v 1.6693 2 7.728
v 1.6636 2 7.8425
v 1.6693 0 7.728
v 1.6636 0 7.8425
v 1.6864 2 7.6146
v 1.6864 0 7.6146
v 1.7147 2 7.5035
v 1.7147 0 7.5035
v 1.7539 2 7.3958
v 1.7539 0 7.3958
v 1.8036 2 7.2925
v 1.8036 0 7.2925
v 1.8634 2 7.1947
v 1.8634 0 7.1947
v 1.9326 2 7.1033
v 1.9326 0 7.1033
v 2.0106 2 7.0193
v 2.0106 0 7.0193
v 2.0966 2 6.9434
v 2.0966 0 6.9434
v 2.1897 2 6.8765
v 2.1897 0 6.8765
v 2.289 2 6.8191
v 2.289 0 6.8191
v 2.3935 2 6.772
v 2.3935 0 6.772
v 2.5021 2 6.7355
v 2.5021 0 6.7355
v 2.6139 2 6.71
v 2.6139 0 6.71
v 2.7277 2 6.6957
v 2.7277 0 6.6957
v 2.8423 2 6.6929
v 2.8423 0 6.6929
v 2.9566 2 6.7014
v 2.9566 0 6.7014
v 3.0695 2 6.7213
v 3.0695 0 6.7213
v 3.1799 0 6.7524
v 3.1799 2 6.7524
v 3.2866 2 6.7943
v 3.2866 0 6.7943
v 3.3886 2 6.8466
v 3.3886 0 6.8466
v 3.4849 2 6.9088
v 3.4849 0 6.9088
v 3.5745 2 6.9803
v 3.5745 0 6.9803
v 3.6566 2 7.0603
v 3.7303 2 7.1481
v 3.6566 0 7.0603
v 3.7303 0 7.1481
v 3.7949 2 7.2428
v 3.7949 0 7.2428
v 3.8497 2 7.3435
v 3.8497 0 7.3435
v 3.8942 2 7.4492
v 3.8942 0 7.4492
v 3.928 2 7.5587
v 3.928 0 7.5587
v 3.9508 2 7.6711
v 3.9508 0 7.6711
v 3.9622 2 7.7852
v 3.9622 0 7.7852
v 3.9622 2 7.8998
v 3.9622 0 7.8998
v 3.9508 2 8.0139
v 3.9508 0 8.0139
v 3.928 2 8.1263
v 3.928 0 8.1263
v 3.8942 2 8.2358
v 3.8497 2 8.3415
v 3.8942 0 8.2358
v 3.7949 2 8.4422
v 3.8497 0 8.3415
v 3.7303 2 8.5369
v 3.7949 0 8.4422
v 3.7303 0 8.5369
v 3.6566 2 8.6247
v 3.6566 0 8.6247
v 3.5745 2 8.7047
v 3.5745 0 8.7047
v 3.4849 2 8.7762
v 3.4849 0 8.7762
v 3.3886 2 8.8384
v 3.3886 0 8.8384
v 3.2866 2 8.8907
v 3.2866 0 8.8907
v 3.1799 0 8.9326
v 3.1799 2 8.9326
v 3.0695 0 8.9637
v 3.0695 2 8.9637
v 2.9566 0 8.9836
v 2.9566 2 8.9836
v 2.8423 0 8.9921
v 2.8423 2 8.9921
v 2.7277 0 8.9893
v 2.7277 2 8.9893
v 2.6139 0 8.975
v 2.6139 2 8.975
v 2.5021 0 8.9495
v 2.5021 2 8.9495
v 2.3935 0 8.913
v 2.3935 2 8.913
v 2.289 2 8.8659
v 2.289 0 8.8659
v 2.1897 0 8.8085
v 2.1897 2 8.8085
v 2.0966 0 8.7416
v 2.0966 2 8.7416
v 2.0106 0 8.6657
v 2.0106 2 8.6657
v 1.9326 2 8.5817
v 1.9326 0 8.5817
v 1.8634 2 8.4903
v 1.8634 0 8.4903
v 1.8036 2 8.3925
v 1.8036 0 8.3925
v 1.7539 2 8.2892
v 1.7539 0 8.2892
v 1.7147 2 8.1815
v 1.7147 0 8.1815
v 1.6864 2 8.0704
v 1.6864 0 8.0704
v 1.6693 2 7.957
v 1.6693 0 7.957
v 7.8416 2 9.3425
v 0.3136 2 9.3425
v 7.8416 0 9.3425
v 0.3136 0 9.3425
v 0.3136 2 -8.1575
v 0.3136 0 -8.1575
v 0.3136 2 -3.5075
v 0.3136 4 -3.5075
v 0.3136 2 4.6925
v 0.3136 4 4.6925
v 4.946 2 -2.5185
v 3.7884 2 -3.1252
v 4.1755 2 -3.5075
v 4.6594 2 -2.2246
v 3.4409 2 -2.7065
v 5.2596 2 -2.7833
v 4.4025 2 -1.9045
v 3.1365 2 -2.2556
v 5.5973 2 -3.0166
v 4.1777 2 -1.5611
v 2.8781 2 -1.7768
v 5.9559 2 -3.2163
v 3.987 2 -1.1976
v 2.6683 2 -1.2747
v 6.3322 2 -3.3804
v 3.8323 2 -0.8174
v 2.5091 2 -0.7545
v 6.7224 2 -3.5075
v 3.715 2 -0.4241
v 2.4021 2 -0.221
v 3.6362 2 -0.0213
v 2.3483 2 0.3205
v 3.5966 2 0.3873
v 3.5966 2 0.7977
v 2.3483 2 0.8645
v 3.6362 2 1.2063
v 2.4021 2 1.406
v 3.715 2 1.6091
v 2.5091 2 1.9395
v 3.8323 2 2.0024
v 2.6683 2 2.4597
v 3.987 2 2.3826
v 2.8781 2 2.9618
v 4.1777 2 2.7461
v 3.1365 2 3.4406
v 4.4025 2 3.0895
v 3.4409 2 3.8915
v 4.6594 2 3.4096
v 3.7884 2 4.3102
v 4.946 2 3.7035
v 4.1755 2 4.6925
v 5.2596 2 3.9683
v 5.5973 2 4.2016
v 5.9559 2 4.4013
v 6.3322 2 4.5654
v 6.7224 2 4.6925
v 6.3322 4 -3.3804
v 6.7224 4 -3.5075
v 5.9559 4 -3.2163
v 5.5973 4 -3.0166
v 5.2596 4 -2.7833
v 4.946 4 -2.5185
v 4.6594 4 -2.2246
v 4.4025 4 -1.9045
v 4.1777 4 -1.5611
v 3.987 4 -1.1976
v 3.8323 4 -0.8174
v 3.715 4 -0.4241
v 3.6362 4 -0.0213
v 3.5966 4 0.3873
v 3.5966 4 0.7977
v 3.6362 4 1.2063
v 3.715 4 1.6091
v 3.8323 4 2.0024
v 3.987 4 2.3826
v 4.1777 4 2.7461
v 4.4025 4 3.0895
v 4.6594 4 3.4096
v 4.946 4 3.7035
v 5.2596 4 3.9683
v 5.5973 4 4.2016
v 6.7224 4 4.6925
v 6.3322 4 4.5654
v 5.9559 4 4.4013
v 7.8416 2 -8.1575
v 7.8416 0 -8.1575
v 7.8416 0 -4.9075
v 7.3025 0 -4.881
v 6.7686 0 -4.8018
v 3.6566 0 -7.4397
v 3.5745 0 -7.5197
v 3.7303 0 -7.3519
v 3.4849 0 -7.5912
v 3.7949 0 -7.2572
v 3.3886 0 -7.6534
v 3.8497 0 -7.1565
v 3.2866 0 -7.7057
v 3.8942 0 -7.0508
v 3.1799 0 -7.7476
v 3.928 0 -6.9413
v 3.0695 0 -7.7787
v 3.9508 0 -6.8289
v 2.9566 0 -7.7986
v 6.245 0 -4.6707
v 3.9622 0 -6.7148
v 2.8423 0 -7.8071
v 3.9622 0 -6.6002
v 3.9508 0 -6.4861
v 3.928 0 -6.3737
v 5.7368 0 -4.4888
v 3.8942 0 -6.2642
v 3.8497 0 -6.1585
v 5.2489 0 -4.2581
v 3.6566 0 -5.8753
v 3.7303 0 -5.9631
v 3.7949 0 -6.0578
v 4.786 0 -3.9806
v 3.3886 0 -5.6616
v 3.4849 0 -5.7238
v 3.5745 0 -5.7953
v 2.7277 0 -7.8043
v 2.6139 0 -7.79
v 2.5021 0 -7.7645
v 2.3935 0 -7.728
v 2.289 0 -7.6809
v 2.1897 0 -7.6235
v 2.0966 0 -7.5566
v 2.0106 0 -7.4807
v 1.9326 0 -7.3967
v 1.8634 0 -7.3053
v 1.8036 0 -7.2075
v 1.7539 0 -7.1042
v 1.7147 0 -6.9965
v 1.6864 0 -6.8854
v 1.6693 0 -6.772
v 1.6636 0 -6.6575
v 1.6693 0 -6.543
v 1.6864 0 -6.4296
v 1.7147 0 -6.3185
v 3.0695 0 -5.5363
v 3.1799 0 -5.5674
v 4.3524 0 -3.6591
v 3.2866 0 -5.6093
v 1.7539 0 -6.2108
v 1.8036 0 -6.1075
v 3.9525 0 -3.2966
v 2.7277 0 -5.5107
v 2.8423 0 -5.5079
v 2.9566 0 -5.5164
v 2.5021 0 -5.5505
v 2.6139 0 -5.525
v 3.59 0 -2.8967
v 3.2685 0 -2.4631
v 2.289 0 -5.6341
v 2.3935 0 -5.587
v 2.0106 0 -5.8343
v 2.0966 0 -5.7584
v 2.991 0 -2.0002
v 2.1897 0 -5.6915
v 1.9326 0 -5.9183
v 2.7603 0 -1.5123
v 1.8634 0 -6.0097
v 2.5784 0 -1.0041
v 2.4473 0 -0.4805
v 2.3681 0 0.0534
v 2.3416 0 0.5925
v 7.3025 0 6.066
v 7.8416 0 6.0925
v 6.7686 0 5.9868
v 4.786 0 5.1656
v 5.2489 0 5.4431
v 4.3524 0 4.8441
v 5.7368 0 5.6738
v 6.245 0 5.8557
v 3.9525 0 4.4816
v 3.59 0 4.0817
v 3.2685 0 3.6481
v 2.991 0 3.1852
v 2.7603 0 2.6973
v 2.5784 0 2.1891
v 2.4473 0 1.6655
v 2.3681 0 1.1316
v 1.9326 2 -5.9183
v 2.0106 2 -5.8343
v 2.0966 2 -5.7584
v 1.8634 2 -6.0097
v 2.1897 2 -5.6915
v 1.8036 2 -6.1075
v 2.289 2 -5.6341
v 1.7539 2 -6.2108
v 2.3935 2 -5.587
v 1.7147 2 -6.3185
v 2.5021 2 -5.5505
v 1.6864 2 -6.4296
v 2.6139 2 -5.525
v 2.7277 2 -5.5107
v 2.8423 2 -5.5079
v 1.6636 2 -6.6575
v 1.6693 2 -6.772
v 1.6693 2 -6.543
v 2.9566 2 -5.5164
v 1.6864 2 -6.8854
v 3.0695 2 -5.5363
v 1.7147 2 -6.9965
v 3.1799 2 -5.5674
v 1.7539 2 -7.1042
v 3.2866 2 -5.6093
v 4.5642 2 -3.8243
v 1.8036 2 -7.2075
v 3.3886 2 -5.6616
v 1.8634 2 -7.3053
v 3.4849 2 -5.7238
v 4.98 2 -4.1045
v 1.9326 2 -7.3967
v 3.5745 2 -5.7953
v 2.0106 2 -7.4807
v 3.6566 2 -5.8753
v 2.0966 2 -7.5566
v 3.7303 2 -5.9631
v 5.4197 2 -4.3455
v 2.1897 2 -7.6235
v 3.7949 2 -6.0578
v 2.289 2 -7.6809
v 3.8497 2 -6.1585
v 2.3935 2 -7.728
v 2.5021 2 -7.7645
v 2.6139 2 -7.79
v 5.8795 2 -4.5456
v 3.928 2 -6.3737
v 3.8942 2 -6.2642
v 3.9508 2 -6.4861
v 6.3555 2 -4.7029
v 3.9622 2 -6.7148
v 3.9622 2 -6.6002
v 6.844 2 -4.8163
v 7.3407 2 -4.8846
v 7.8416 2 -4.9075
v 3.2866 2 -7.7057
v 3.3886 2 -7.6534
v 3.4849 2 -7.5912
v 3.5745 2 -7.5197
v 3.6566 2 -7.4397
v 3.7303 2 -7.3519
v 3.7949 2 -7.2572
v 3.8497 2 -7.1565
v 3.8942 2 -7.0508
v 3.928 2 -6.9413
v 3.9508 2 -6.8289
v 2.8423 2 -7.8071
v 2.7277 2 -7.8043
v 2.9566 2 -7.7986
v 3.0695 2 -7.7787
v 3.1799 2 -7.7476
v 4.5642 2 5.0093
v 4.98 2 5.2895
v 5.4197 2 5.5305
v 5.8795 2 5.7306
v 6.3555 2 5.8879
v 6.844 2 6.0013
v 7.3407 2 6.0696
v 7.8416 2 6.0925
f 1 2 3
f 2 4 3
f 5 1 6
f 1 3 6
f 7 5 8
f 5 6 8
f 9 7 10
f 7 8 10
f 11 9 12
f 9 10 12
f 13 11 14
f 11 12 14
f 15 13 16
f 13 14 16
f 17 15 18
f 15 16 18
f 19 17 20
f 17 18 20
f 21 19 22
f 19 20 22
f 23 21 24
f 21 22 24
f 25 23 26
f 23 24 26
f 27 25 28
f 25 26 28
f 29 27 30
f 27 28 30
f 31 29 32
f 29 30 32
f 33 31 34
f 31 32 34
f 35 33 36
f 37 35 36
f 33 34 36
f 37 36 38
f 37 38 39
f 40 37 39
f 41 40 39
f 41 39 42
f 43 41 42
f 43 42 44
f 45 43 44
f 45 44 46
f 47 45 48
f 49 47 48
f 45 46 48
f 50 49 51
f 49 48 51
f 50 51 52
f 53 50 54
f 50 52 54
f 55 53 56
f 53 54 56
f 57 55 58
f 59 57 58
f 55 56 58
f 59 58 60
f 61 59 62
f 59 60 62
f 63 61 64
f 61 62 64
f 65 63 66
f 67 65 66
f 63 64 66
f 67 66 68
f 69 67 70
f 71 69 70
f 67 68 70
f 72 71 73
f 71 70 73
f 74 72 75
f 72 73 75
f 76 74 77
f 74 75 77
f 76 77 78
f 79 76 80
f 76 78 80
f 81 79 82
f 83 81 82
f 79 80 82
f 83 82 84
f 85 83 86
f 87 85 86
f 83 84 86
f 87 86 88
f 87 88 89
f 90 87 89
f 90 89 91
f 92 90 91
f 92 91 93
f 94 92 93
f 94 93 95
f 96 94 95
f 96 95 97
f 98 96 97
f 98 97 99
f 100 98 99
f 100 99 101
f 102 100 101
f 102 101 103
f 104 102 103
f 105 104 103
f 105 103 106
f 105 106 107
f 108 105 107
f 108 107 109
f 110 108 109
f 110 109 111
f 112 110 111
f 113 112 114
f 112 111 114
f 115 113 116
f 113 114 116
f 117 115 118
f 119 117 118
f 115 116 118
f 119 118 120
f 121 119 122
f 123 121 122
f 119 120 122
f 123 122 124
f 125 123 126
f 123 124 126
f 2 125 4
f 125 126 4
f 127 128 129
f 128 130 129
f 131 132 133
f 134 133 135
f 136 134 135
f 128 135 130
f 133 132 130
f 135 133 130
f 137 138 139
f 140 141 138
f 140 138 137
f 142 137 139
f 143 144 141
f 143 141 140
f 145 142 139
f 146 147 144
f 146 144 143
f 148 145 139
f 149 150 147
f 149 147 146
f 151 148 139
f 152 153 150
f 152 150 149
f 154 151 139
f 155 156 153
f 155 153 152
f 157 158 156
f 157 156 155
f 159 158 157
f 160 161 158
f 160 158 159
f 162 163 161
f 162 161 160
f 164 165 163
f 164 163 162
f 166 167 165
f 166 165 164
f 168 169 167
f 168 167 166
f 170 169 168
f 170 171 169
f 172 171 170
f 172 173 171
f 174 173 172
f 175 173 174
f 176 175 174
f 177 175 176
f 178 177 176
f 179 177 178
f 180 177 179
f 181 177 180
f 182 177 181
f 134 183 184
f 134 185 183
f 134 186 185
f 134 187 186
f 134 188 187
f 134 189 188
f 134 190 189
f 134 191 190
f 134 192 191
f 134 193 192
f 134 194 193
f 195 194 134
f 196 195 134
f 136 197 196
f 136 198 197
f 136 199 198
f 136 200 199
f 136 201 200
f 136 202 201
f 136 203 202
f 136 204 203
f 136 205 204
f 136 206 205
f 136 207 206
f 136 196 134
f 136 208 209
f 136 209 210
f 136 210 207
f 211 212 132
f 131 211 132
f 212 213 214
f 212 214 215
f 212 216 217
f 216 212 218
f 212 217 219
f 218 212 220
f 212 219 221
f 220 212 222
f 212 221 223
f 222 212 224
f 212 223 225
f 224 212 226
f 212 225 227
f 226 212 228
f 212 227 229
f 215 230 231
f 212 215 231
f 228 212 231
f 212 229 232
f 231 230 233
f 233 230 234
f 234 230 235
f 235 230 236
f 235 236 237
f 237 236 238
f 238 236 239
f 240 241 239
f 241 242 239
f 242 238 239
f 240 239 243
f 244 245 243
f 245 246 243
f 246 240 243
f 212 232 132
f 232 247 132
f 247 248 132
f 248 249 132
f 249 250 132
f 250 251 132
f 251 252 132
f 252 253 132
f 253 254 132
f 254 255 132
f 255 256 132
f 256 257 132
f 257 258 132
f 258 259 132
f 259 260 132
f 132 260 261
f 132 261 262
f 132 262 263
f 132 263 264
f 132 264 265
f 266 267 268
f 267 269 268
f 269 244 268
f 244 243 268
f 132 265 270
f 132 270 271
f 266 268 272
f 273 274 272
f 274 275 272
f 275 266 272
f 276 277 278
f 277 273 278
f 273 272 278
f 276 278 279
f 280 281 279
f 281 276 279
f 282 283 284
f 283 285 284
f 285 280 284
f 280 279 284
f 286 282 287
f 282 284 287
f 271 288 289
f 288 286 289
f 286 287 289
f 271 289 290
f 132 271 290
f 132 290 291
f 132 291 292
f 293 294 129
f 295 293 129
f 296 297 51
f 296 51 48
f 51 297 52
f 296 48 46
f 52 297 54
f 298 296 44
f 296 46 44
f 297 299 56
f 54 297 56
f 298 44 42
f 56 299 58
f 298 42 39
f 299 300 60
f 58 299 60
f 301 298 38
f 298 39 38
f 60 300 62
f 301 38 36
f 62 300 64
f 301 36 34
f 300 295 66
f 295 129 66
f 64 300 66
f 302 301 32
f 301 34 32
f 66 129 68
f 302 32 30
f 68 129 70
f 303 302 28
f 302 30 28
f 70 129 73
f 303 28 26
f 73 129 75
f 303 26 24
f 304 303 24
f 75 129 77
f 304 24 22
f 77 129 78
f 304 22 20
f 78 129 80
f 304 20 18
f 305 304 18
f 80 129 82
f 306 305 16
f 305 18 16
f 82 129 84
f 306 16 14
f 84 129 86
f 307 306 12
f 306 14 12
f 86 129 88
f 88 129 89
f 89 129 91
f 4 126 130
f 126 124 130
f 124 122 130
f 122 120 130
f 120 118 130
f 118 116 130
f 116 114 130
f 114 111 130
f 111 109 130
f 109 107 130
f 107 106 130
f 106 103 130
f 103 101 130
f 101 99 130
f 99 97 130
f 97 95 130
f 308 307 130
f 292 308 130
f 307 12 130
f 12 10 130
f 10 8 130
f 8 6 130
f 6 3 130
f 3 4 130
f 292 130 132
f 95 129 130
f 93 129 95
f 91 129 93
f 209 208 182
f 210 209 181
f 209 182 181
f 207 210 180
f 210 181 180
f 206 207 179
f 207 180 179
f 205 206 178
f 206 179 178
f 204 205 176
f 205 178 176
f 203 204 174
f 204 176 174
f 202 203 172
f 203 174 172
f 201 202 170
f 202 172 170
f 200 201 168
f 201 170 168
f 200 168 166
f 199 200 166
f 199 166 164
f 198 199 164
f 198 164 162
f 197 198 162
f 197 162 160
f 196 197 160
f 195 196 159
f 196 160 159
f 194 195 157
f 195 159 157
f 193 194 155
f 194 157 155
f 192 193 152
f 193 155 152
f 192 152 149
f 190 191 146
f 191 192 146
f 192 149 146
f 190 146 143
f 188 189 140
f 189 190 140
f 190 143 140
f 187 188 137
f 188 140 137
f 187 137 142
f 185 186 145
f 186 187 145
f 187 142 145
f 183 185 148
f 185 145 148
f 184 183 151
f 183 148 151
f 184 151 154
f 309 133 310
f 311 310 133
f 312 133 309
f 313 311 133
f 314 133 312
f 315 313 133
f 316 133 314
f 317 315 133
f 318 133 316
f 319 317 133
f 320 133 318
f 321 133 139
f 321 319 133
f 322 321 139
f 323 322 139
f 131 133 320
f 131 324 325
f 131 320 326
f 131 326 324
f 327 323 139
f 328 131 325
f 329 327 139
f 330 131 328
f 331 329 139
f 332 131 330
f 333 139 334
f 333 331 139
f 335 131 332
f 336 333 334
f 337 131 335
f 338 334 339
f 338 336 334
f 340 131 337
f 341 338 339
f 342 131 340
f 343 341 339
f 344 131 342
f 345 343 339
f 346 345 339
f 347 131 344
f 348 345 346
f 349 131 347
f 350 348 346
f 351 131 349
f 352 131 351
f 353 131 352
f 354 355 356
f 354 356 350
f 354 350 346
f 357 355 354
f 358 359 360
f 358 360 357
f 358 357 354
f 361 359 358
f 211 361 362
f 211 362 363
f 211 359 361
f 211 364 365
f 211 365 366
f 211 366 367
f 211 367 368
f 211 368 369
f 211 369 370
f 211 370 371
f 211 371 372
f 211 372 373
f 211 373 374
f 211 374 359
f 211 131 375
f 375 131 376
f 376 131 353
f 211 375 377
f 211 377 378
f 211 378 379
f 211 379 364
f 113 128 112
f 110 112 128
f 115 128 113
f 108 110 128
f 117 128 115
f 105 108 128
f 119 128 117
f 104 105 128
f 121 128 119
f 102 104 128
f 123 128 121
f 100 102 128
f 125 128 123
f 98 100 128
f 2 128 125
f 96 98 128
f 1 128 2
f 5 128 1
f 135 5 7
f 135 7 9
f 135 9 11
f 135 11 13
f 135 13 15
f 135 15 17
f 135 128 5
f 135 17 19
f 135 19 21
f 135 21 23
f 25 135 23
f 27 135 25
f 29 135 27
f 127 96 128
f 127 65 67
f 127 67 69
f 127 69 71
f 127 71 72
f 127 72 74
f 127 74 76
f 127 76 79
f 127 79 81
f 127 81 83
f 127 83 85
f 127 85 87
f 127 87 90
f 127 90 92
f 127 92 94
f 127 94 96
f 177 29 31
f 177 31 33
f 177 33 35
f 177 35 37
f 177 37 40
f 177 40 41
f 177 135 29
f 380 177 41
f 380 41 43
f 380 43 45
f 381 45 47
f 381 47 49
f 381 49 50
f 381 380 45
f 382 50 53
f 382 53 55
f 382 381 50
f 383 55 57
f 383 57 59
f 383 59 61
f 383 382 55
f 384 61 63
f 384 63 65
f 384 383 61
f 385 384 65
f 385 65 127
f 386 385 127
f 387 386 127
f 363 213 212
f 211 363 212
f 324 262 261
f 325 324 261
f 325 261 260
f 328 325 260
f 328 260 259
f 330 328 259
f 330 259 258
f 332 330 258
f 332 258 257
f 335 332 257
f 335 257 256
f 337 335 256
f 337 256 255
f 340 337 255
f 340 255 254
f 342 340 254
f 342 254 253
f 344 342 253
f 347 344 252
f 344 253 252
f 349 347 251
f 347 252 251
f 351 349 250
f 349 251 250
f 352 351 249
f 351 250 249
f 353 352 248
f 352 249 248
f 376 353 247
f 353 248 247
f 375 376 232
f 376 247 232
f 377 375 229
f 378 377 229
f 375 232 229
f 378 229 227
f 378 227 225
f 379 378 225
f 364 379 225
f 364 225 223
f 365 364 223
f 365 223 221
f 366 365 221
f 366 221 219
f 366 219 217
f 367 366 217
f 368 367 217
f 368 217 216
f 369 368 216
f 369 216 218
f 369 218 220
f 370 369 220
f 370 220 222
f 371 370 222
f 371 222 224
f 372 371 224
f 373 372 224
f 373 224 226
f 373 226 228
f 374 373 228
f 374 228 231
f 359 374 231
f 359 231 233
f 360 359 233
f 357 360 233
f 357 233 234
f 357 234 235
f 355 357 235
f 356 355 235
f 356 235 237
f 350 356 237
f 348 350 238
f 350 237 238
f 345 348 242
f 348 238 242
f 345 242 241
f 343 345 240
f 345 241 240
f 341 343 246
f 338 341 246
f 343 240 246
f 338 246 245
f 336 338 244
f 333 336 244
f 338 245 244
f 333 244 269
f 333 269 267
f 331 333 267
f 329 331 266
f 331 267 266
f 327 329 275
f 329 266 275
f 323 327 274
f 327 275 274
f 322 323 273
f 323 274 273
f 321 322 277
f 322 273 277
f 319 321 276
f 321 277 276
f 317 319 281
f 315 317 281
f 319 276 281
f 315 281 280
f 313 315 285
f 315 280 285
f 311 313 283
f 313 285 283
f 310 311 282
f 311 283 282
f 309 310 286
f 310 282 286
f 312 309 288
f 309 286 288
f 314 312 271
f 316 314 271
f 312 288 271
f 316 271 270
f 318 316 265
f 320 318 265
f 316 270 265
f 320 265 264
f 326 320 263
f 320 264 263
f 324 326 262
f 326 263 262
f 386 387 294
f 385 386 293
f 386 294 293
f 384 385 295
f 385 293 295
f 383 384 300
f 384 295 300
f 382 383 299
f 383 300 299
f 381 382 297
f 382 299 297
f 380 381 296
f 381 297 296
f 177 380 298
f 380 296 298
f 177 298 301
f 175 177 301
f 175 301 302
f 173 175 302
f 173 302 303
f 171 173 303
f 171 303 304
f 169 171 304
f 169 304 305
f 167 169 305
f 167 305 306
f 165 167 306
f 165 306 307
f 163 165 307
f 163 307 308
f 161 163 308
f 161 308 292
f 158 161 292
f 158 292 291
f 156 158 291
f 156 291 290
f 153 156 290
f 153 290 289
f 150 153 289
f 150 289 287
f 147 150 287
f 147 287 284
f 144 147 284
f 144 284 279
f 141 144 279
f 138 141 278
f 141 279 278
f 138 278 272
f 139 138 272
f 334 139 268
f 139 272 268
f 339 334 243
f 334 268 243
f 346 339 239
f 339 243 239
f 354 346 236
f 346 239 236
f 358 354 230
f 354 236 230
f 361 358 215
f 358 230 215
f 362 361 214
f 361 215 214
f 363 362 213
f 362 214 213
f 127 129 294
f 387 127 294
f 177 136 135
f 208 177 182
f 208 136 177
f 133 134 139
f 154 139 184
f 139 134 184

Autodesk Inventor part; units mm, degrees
ref_plane "YZ Plane" through (0, 0, 0) normal (1, 0, 0) x (0, 1, 0)
ref_plane "XZ Plane" through (0, 0, 0) normal (0, 1, 0) x (-1, 0, 0)
ref_plane "XY Plane" through (0, 0, 0) normal (0, 0, 1) x (1, 0, 0)
sketch "Sketch1" plane through (0, 0, 0) normal (0, 1, 0) x (-1, 0, 0)
  line L0 (-0.3136, 9.3425) -> (-7.8416, 9.3425)
  line L1 (-7.8416, -8.1575) -> (-0.3136, -8.1575)
  line L2 (-0.3136, -8.1575) -> (-0.3136, 9.3425)
  circle A0 centre (-2.8136, 7.8425) radius 1.15
  circle A1 centre (-2.8136, -6.6575) radius 1.15
  arc A2 (-7.8416, -3.6575) -> (-7.8416, 4.8425) centre (-7.8416, 0.5925) ccw
  line L3 (-7.8416, 9.3425) -> (-7.8416, 4.8425)
  line L4 (-7.8416, -3.6575) -> (-7.8416, -8.1575)
  point P0 (0, 0)
  point P1 (0, 0)
  dimension "d0" = 17.5
  dimension "d1" = 2.5
  dimension "d2" = 2.5
  dimension "d3" = 1.5
  dimension "d4" = 1.5
  dimension "d5" = 2.3
  dimension "d6" = 2.3
  dimension "d7" = 8.5
  dimension "d8" = 7.528
  dimension "d9" = 8.75
extrude "Extrusion1" add sketch "Sketch1" along normal blind 4
sketch "Sketch3" plane through (0, 0, 0) normal (0, -1, 0) x (1, 0, 0)
  circle A0 centre (7.8416, 0.5925) radius 5.5
  line L0 (7.8416, 9.3425) -> (7.8416, 4.8425) projected
  line L1 (7.8416, -8.1575) -> (0.3136, -8.1575) projected
  point P0 (0, 0)
  dimension "d12" = 11
  dimension "d13" = 0
  dimension "d14" = 8.75
extrude "Extrusion2" cut sketch "Sketch3" against normal blind 2
sketch "Sketch4" plane through (0, 4, 0) normal (0, 1, 0) x (1, 0, 0)
  line L0 (7.8416, -9.3425) -> (0.3136, -9.3425)
  line L1 (0.3136, -9.3425) -> (0.3136, -4.6925)
  line L2 (0.3136, -4.6925) -> (7.8416, -4.6925)
  line L3 (7.8416, -4.6925) -> (7.8416, -9.3425)
  line L4 (7.8416, 3.6575) -> (7.8416, 8.1575) projected
  line L5 (0.3136, 8.1575) -> (0.3136, -9.3425) projected
  line L6 (7.8416, 8.1575) -> (0.3136, 8.1575)
  line L7 (0.3136, 8.1575) -> (0.3136, 3.5075)
  line L8 (0.3136, 3.5075) -> (7.8416, 3.5075)
  line L9 (7.8416, 3.5075) -> (7.8416, 8.1575)
  point P0 (0, 0)
  dimension "d17" = 4.65
  dimension "d18" = 4.65
  dimension "d23" = 0
extrude "Extrusion3" cut sketch "Sketch4" against normal blind 2 contours L0 L1 L2 L3
extrude "Extrusion4" cut sketch "Sketch4" against normal blind 2 contours L5 L6 L4 L9 L8
properties part number "UCover_PWR"
